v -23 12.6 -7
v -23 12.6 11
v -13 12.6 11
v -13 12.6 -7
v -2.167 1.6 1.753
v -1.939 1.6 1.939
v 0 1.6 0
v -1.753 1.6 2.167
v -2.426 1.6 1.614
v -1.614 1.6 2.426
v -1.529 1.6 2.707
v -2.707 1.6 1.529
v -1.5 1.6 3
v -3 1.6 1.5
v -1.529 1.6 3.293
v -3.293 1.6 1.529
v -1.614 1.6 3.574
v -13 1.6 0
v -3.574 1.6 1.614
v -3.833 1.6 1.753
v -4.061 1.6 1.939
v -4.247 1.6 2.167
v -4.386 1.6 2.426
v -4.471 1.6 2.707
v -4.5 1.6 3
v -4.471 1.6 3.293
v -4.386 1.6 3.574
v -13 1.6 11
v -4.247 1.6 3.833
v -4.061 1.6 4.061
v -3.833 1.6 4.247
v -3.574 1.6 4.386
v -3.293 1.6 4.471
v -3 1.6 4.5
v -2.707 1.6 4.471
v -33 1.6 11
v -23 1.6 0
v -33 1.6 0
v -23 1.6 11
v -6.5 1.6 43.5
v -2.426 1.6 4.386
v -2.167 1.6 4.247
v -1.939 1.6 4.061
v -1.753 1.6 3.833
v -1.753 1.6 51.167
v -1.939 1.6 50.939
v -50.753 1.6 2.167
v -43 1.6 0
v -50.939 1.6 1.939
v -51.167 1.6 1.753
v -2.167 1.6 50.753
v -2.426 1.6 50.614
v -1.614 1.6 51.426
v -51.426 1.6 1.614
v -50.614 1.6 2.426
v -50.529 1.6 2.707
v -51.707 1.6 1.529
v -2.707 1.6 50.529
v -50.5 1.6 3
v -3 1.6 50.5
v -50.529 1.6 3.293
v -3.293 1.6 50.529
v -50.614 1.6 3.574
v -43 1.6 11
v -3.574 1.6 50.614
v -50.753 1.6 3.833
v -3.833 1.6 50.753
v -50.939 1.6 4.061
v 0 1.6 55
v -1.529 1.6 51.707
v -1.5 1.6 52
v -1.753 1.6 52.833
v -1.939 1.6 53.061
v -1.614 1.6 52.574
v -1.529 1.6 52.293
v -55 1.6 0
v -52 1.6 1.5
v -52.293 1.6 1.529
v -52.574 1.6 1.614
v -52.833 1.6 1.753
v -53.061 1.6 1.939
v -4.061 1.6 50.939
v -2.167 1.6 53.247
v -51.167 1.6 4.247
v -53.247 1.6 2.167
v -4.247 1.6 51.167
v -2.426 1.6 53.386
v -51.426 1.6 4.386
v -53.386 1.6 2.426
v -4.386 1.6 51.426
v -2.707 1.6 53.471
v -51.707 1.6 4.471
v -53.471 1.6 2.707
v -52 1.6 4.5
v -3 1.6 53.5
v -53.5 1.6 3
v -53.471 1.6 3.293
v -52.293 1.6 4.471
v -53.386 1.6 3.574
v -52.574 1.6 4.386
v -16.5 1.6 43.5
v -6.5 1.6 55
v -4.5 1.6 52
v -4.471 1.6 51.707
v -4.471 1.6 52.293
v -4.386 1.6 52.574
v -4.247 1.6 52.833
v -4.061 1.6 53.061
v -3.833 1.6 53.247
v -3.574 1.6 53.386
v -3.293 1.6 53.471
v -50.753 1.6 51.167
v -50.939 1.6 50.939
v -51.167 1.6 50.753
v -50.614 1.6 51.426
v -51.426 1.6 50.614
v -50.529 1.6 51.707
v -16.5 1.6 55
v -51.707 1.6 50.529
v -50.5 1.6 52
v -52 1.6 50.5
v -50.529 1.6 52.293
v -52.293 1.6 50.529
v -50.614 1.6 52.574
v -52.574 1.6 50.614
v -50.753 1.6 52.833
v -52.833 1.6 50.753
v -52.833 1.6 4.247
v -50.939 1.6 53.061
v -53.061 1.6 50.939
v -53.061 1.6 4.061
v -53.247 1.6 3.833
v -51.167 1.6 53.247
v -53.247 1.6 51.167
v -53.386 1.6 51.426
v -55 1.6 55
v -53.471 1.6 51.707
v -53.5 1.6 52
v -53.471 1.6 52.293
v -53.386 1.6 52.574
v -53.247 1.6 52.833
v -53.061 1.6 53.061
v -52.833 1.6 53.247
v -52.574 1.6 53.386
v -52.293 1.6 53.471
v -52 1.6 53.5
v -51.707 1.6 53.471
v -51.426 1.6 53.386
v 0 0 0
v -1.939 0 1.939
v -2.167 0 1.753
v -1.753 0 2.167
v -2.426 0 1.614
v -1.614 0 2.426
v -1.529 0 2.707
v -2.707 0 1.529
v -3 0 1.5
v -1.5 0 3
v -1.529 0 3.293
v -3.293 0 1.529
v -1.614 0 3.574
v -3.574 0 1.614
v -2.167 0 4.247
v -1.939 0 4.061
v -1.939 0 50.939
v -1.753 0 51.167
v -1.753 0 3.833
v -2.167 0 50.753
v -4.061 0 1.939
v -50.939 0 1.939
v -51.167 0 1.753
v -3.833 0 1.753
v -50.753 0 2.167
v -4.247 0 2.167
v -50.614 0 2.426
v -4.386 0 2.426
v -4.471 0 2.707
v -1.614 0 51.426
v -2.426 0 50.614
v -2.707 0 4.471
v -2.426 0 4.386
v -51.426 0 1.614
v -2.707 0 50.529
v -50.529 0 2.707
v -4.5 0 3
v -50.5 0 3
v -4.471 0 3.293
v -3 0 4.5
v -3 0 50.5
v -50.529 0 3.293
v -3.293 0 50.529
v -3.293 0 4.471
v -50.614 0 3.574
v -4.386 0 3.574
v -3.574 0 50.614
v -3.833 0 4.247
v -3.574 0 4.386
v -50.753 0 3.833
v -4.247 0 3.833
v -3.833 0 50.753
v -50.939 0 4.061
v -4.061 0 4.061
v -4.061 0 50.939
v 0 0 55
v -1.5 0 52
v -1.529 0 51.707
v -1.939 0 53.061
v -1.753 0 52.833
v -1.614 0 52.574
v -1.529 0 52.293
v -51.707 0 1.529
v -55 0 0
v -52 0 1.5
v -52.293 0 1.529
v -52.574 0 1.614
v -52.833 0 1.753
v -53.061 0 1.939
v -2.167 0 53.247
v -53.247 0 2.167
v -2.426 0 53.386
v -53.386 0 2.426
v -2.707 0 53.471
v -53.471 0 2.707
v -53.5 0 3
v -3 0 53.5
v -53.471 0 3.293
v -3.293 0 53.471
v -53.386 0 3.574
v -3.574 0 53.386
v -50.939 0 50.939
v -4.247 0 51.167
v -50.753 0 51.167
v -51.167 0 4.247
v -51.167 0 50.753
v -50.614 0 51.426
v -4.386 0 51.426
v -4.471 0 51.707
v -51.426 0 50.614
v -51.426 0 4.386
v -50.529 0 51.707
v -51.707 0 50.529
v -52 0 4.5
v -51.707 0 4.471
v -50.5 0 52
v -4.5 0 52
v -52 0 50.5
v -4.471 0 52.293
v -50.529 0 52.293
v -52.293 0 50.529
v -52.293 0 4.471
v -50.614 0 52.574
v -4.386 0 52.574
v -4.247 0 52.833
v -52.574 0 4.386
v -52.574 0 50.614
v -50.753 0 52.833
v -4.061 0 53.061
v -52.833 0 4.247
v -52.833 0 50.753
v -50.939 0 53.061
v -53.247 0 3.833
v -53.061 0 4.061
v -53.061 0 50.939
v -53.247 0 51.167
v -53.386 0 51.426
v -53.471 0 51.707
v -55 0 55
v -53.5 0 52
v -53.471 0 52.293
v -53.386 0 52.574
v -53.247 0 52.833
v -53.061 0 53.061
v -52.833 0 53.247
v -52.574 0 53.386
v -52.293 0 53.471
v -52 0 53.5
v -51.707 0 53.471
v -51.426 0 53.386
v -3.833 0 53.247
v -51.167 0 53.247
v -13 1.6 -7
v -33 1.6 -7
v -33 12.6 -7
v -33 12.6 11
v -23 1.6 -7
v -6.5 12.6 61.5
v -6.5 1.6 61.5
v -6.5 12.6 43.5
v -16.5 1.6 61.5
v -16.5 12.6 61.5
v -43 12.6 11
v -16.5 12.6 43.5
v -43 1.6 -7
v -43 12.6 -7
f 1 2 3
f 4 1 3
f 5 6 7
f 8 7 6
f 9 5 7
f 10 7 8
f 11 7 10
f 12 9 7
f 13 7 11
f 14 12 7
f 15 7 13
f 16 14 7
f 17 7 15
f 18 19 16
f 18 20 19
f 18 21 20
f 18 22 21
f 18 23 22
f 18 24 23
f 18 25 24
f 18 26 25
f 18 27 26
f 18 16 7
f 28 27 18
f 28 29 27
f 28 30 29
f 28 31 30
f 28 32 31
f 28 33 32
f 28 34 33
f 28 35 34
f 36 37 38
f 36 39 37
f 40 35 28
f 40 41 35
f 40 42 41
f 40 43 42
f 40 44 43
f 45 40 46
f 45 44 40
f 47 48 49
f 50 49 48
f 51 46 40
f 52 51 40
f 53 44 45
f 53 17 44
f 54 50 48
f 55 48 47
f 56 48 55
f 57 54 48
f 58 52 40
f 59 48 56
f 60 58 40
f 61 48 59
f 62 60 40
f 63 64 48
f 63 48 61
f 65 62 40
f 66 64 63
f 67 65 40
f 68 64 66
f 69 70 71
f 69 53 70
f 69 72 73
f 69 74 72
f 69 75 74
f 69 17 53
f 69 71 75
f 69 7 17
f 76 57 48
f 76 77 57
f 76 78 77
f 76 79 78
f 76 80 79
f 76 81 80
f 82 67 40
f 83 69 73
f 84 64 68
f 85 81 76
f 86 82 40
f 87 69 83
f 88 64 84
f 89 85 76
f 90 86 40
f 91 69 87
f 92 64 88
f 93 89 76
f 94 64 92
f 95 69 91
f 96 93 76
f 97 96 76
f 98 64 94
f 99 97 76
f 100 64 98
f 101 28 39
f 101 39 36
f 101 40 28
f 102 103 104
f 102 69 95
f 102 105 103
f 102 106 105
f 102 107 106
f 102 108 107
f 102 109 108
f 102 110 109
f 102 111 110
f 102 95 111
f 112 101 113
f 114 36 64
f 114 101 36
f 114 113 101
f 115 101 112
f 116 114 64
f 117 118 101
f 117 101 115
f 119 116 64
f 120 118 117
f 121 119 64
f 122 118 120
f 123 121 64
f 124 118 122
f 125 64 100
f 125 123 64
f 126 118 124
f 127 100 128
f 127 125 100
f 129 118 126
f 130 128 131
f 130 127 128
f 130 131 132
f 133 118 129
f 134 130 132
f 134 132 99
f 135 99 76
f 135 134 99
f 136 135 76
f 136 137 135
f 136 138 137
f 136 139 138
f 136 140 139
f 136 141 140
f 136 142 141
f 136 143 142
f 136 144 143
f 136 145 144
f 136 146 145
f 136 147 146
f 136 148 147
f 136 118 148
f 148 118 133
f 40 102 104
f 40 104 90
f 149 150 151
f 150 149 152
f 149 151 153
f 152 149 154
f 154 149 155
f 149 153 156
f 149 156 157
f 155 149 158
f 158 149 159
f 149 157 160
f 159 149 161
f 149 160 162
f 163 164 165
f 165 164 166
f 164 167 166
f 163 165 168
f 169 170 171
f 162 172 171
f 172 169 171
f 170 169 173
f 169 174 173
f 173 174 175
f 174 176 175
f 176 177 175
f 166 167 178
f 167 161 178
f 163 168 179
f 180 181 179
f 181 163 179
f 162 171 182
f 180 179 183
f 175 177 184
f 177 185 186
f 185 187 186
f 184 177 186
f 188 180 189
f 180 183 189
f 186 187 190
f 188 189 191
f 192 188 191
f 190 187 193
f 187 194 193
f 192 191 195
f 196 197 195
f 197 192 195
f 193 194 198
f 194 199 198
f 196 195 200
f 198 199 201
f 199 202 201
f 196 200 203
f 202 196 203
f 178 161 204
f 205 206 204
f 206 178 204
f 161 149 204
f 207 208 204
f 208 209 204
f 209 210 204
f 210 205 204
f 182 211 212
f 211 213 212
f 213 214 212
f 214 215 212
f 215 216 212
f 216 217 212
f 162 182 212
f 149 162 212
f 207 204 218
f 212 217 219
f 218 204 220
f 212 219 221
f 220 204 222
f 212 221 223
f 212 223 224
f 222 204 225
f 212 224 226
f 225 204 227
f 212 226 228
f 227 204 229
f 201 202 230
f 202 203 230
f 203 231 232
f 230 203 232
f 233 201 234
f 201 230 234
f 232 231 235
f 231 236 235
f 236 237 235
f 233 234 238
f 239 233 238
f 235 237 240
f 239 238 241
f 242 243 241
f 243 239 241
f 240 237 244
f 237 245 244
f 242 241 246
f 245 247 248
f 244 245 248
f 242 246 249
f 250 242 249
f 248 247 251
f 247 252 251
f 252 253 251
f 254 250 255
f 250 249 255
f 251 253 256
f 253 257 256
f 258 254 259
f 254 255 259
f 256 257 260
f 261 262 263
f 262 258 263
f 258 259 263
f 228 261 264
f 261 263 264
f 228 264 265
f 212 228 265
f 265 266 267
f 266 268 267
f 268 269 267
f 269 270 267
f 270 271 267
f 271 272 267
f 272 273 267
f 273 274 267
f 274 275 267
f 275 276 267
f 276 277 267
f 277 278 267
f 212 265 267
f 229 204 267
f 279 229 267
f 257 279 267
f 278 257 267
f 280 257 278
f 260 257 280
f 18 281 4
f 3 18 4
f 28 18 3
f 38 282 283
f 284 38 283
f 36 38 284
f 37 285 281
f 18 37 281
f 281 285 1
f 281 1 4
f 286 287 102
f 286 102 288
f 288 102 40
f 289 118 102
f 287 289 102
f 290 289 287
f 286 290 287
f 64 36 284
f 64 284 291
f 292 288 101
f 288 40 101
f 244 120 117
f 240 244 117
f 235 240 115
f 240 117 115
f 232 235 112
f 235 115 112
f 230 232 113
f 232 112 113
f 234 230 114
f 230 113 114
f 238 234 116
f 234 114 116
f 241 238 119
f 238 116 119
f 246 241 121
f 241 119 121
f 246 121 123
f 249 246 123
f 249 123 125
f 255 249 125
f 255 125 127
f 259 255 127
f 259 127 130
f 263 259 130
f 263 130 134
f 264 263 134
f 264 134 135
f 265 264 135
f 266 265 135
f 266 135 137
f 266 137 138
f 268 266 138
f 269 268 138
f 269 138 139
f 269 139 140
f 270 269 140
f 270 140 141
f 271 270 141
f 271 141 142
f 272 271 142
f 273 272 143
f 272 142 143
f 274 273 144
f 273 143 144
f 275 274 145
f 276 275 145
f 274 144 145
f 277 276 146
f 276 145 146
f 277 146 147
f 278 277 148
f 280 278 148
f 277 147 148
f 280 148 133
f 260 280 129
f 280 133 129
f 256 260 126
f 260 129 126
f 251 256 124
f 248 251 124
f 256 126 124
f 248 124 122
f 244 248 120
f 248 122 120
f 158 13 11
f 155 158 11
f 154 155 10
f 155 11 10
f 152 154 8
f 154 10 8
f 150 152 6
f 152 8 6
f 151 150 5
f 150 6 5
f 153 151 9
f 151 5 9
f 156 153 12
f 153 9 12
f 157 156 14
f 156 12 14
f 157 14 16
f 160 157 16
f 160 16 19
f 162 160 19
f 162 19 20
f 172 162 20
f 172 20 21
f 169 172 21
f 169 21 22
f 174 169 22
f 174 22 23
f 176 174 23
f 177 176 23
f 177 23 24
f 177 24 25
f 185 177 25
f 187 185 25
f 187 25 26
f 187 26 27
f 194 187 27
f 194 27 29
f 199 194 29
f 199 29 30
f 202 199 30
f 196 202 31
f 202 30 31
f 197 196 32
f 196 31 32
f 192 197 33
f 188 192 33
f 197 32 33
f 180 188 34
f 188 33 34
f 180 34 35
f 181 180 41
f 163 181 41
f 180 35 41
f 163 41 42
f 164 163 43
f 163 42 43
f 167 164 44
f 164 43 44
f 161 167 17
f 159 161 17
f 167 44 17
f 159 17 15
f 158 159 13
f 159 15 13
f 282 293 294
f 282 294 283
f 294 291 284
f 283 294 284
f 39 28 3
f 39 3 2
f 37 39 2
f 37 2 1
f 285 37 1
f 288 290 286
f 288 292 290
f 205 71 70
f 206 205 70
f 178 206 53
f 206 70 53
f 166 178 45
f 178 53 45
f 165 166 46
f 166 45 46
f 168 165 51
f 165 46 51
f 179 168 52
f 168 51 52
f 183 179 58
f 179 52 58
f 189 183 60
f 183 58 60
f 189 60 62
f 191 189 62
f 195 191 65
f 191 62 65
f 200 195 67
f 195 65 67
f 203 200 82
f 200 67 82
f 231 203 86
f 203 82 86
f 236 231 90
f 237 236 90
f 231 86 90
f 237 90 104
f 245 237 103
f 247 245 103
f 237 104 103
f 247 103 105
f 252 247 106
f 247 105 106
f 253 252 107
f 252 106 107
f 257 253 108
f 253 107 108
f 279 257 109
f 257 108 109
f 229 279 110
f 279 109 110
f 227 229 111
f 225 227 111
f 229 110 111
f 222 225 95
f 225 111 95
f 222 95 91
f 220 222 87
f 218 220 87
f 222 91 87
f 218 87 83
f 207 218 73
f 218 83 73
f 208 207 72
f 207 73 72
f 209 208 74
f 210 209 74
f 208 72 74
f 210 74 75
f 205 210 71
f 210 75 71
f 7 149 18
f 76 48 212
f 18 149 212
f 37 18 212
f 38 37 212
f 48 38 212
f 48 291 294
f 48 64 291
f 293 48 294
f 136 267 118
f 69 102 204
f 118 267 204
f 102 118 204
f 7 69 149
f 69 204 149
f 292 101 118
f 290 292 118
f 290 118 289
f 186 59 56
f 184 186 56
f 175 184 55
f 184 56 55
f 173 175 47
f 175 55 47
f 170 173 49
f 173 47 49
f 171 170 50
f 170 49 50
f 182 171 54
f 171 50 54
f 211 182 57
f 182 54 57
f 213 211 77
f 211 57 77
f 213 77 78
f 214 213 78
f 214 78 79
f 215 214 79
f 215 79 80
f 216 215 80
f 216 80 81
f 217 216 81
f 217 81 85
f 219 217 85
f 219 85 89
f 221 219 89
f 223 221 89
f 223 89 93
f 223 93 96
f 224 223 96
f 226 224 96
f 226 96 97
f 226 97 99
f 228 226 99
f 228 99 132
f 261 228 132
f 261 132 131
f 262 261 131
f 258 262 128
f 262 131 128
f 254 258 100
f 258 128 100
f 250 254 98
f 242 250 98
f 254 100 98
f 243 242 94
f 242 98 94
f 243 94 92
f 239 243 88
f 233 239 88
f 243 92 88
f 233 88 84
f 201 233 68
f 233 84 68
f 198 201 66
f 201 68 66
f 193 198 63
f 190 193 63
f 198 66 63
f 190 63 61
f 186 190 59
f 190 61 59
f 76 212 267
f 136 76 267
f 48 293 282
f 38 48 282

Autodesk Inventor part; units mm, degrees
ref_plane "YZ Plane" through (0, 0, 0) normal (1, 0, 0) x (0, 1, 0)
ref_plane "XZ Plane" through (0, 0, 0) normal (0, 1, 0) x (-1, 0, 0)
ref_plane "XY Plane" through (0, 0, 0) normal (0, 0, 1) x (1, 0, 0)
sketch "Sketch1" plane through (0, 0, 0) normal (0, 1, 0) x (-1, 0, 0)
  line L0 (0, 0) -> (55, 0)
  line L1 (55, 0) -> (55, 55)
  line L2 (55, 55) -> (0, 55)
  line L3 (0, 55) -> (0, 0)
  dimension "d0" = 55
  dimension "d1" = 55
extrude "Extrusion1" add sketch "Sketch1" along normal blind 1.6
sketch "Sketch2" plane through (0, 1.6, 0) normal (0, 1, 0) x (1, 0, 0)
  line L0 (-52, -52) -> (-3, -52) construction
  line L1 (-3, -52) -> (-3, -3) construction
  line L2 (-3, -3) -> (-52, -3) construction
  line L3 (-52, -3) -> (-52, -52) construction
  line L4 (-52, -52) -> (-55, -52) construction
  line L5 (-55, 0) -> (-55, -55) construction
  line L6 (-52, -52) -> (-52, -55) construction
  line L7 (-55, -55) -> (0, -55) construction
  line L8 (-3, -3) -> (-3, 0) construction
  line L9 (0, 0) -> (-55, 0) construction
  line L10 (-3, -3) -> (0, -3) construction
  line L11 (0, -55) -> (0, 0) construction
  circle A0 centre (-52, -52) radius 1.5
  circle A1 centre (-52, -3) radius 1.5
  circle A2 centre (-3, -3) radius 1.5
  circle A3 centre (-3, -52) radius 1.5
  dimension "d4" = 49
  dimension "d5" = 49
  dimension "d6" = 3
  dimension "d7" = 3
  dimension "d8" = 3
  dimension "d9" = 3
extrude "Extrusion2" cut sketch "Sketch2" against normal up to next
sketch "Sketch3" plane through (0, 1.6, 0) normal (0, 1, 0) x (1, 0, 0)
  line L0 (-6.5, -43.5) -> (-16.5, -43.5)
  line L1 (-16.5, -43.5) -> (-16.5, -61.5)
  line L2 (-16.5, -61.5) -> (-6.5, -61.5)
  line L3 (-6.5, -61.5) -> (-6.5, -43.5)
  line L4 (-55, -55) -> (0, -55) projected
  point P0 (0, 0)
  dimension "d12" = 10
  dimension "d13" = 18
  dimension "d14" = 6.5
  dimension "d15" = 6.5
extrude "Extrusion3" add sketch "Sketch3" along normal blind 11
sketch "Sketch4" plane through (0, 1.6, 0) normal (0, 1, 0) x (1, 0, 0)
  line L0 (-13, -11) -> (-23, -11)
  line L1 (-23, -11) -> (-23, 7)
  line L2 (-23, 7) -> (-13, 7)
  line L3 (-13, 7) -> (-13, -11)
  line L4 (-33, -11) -> (-43, -11)
  line L5 (-43, -11) -> (-43, 7)
  line L6 (-43, 7) -> (-33, 7)
  line L7 (-33, 7) -> (-33, -11)
  line L8 (0, -55) -> (0, 0) projected
  line L9 (0, 0) -> (-55, 0) projected
  dimension "d18" = 10
  dimension "d19" = 10
  dimension "d20" = 18
  dimension "d21" = 18
  dimension "d22" = 10
  dimension "d23" = 13
  dimension "d24" = 7
extrude "Extrusion4" add sketch "Sketch4" along normal blind 11
equation "\"d1\" = d0"
equation "\"d7\" = d6"
equation "\"d8\" = d6"
equation "\"d9\" = d6"
equation "\"d10\" = d5"
equation "\"d19\" = d18"
equation "\"d21\" = d20"
properties part number "Drok L298 DC Motor Driver"
